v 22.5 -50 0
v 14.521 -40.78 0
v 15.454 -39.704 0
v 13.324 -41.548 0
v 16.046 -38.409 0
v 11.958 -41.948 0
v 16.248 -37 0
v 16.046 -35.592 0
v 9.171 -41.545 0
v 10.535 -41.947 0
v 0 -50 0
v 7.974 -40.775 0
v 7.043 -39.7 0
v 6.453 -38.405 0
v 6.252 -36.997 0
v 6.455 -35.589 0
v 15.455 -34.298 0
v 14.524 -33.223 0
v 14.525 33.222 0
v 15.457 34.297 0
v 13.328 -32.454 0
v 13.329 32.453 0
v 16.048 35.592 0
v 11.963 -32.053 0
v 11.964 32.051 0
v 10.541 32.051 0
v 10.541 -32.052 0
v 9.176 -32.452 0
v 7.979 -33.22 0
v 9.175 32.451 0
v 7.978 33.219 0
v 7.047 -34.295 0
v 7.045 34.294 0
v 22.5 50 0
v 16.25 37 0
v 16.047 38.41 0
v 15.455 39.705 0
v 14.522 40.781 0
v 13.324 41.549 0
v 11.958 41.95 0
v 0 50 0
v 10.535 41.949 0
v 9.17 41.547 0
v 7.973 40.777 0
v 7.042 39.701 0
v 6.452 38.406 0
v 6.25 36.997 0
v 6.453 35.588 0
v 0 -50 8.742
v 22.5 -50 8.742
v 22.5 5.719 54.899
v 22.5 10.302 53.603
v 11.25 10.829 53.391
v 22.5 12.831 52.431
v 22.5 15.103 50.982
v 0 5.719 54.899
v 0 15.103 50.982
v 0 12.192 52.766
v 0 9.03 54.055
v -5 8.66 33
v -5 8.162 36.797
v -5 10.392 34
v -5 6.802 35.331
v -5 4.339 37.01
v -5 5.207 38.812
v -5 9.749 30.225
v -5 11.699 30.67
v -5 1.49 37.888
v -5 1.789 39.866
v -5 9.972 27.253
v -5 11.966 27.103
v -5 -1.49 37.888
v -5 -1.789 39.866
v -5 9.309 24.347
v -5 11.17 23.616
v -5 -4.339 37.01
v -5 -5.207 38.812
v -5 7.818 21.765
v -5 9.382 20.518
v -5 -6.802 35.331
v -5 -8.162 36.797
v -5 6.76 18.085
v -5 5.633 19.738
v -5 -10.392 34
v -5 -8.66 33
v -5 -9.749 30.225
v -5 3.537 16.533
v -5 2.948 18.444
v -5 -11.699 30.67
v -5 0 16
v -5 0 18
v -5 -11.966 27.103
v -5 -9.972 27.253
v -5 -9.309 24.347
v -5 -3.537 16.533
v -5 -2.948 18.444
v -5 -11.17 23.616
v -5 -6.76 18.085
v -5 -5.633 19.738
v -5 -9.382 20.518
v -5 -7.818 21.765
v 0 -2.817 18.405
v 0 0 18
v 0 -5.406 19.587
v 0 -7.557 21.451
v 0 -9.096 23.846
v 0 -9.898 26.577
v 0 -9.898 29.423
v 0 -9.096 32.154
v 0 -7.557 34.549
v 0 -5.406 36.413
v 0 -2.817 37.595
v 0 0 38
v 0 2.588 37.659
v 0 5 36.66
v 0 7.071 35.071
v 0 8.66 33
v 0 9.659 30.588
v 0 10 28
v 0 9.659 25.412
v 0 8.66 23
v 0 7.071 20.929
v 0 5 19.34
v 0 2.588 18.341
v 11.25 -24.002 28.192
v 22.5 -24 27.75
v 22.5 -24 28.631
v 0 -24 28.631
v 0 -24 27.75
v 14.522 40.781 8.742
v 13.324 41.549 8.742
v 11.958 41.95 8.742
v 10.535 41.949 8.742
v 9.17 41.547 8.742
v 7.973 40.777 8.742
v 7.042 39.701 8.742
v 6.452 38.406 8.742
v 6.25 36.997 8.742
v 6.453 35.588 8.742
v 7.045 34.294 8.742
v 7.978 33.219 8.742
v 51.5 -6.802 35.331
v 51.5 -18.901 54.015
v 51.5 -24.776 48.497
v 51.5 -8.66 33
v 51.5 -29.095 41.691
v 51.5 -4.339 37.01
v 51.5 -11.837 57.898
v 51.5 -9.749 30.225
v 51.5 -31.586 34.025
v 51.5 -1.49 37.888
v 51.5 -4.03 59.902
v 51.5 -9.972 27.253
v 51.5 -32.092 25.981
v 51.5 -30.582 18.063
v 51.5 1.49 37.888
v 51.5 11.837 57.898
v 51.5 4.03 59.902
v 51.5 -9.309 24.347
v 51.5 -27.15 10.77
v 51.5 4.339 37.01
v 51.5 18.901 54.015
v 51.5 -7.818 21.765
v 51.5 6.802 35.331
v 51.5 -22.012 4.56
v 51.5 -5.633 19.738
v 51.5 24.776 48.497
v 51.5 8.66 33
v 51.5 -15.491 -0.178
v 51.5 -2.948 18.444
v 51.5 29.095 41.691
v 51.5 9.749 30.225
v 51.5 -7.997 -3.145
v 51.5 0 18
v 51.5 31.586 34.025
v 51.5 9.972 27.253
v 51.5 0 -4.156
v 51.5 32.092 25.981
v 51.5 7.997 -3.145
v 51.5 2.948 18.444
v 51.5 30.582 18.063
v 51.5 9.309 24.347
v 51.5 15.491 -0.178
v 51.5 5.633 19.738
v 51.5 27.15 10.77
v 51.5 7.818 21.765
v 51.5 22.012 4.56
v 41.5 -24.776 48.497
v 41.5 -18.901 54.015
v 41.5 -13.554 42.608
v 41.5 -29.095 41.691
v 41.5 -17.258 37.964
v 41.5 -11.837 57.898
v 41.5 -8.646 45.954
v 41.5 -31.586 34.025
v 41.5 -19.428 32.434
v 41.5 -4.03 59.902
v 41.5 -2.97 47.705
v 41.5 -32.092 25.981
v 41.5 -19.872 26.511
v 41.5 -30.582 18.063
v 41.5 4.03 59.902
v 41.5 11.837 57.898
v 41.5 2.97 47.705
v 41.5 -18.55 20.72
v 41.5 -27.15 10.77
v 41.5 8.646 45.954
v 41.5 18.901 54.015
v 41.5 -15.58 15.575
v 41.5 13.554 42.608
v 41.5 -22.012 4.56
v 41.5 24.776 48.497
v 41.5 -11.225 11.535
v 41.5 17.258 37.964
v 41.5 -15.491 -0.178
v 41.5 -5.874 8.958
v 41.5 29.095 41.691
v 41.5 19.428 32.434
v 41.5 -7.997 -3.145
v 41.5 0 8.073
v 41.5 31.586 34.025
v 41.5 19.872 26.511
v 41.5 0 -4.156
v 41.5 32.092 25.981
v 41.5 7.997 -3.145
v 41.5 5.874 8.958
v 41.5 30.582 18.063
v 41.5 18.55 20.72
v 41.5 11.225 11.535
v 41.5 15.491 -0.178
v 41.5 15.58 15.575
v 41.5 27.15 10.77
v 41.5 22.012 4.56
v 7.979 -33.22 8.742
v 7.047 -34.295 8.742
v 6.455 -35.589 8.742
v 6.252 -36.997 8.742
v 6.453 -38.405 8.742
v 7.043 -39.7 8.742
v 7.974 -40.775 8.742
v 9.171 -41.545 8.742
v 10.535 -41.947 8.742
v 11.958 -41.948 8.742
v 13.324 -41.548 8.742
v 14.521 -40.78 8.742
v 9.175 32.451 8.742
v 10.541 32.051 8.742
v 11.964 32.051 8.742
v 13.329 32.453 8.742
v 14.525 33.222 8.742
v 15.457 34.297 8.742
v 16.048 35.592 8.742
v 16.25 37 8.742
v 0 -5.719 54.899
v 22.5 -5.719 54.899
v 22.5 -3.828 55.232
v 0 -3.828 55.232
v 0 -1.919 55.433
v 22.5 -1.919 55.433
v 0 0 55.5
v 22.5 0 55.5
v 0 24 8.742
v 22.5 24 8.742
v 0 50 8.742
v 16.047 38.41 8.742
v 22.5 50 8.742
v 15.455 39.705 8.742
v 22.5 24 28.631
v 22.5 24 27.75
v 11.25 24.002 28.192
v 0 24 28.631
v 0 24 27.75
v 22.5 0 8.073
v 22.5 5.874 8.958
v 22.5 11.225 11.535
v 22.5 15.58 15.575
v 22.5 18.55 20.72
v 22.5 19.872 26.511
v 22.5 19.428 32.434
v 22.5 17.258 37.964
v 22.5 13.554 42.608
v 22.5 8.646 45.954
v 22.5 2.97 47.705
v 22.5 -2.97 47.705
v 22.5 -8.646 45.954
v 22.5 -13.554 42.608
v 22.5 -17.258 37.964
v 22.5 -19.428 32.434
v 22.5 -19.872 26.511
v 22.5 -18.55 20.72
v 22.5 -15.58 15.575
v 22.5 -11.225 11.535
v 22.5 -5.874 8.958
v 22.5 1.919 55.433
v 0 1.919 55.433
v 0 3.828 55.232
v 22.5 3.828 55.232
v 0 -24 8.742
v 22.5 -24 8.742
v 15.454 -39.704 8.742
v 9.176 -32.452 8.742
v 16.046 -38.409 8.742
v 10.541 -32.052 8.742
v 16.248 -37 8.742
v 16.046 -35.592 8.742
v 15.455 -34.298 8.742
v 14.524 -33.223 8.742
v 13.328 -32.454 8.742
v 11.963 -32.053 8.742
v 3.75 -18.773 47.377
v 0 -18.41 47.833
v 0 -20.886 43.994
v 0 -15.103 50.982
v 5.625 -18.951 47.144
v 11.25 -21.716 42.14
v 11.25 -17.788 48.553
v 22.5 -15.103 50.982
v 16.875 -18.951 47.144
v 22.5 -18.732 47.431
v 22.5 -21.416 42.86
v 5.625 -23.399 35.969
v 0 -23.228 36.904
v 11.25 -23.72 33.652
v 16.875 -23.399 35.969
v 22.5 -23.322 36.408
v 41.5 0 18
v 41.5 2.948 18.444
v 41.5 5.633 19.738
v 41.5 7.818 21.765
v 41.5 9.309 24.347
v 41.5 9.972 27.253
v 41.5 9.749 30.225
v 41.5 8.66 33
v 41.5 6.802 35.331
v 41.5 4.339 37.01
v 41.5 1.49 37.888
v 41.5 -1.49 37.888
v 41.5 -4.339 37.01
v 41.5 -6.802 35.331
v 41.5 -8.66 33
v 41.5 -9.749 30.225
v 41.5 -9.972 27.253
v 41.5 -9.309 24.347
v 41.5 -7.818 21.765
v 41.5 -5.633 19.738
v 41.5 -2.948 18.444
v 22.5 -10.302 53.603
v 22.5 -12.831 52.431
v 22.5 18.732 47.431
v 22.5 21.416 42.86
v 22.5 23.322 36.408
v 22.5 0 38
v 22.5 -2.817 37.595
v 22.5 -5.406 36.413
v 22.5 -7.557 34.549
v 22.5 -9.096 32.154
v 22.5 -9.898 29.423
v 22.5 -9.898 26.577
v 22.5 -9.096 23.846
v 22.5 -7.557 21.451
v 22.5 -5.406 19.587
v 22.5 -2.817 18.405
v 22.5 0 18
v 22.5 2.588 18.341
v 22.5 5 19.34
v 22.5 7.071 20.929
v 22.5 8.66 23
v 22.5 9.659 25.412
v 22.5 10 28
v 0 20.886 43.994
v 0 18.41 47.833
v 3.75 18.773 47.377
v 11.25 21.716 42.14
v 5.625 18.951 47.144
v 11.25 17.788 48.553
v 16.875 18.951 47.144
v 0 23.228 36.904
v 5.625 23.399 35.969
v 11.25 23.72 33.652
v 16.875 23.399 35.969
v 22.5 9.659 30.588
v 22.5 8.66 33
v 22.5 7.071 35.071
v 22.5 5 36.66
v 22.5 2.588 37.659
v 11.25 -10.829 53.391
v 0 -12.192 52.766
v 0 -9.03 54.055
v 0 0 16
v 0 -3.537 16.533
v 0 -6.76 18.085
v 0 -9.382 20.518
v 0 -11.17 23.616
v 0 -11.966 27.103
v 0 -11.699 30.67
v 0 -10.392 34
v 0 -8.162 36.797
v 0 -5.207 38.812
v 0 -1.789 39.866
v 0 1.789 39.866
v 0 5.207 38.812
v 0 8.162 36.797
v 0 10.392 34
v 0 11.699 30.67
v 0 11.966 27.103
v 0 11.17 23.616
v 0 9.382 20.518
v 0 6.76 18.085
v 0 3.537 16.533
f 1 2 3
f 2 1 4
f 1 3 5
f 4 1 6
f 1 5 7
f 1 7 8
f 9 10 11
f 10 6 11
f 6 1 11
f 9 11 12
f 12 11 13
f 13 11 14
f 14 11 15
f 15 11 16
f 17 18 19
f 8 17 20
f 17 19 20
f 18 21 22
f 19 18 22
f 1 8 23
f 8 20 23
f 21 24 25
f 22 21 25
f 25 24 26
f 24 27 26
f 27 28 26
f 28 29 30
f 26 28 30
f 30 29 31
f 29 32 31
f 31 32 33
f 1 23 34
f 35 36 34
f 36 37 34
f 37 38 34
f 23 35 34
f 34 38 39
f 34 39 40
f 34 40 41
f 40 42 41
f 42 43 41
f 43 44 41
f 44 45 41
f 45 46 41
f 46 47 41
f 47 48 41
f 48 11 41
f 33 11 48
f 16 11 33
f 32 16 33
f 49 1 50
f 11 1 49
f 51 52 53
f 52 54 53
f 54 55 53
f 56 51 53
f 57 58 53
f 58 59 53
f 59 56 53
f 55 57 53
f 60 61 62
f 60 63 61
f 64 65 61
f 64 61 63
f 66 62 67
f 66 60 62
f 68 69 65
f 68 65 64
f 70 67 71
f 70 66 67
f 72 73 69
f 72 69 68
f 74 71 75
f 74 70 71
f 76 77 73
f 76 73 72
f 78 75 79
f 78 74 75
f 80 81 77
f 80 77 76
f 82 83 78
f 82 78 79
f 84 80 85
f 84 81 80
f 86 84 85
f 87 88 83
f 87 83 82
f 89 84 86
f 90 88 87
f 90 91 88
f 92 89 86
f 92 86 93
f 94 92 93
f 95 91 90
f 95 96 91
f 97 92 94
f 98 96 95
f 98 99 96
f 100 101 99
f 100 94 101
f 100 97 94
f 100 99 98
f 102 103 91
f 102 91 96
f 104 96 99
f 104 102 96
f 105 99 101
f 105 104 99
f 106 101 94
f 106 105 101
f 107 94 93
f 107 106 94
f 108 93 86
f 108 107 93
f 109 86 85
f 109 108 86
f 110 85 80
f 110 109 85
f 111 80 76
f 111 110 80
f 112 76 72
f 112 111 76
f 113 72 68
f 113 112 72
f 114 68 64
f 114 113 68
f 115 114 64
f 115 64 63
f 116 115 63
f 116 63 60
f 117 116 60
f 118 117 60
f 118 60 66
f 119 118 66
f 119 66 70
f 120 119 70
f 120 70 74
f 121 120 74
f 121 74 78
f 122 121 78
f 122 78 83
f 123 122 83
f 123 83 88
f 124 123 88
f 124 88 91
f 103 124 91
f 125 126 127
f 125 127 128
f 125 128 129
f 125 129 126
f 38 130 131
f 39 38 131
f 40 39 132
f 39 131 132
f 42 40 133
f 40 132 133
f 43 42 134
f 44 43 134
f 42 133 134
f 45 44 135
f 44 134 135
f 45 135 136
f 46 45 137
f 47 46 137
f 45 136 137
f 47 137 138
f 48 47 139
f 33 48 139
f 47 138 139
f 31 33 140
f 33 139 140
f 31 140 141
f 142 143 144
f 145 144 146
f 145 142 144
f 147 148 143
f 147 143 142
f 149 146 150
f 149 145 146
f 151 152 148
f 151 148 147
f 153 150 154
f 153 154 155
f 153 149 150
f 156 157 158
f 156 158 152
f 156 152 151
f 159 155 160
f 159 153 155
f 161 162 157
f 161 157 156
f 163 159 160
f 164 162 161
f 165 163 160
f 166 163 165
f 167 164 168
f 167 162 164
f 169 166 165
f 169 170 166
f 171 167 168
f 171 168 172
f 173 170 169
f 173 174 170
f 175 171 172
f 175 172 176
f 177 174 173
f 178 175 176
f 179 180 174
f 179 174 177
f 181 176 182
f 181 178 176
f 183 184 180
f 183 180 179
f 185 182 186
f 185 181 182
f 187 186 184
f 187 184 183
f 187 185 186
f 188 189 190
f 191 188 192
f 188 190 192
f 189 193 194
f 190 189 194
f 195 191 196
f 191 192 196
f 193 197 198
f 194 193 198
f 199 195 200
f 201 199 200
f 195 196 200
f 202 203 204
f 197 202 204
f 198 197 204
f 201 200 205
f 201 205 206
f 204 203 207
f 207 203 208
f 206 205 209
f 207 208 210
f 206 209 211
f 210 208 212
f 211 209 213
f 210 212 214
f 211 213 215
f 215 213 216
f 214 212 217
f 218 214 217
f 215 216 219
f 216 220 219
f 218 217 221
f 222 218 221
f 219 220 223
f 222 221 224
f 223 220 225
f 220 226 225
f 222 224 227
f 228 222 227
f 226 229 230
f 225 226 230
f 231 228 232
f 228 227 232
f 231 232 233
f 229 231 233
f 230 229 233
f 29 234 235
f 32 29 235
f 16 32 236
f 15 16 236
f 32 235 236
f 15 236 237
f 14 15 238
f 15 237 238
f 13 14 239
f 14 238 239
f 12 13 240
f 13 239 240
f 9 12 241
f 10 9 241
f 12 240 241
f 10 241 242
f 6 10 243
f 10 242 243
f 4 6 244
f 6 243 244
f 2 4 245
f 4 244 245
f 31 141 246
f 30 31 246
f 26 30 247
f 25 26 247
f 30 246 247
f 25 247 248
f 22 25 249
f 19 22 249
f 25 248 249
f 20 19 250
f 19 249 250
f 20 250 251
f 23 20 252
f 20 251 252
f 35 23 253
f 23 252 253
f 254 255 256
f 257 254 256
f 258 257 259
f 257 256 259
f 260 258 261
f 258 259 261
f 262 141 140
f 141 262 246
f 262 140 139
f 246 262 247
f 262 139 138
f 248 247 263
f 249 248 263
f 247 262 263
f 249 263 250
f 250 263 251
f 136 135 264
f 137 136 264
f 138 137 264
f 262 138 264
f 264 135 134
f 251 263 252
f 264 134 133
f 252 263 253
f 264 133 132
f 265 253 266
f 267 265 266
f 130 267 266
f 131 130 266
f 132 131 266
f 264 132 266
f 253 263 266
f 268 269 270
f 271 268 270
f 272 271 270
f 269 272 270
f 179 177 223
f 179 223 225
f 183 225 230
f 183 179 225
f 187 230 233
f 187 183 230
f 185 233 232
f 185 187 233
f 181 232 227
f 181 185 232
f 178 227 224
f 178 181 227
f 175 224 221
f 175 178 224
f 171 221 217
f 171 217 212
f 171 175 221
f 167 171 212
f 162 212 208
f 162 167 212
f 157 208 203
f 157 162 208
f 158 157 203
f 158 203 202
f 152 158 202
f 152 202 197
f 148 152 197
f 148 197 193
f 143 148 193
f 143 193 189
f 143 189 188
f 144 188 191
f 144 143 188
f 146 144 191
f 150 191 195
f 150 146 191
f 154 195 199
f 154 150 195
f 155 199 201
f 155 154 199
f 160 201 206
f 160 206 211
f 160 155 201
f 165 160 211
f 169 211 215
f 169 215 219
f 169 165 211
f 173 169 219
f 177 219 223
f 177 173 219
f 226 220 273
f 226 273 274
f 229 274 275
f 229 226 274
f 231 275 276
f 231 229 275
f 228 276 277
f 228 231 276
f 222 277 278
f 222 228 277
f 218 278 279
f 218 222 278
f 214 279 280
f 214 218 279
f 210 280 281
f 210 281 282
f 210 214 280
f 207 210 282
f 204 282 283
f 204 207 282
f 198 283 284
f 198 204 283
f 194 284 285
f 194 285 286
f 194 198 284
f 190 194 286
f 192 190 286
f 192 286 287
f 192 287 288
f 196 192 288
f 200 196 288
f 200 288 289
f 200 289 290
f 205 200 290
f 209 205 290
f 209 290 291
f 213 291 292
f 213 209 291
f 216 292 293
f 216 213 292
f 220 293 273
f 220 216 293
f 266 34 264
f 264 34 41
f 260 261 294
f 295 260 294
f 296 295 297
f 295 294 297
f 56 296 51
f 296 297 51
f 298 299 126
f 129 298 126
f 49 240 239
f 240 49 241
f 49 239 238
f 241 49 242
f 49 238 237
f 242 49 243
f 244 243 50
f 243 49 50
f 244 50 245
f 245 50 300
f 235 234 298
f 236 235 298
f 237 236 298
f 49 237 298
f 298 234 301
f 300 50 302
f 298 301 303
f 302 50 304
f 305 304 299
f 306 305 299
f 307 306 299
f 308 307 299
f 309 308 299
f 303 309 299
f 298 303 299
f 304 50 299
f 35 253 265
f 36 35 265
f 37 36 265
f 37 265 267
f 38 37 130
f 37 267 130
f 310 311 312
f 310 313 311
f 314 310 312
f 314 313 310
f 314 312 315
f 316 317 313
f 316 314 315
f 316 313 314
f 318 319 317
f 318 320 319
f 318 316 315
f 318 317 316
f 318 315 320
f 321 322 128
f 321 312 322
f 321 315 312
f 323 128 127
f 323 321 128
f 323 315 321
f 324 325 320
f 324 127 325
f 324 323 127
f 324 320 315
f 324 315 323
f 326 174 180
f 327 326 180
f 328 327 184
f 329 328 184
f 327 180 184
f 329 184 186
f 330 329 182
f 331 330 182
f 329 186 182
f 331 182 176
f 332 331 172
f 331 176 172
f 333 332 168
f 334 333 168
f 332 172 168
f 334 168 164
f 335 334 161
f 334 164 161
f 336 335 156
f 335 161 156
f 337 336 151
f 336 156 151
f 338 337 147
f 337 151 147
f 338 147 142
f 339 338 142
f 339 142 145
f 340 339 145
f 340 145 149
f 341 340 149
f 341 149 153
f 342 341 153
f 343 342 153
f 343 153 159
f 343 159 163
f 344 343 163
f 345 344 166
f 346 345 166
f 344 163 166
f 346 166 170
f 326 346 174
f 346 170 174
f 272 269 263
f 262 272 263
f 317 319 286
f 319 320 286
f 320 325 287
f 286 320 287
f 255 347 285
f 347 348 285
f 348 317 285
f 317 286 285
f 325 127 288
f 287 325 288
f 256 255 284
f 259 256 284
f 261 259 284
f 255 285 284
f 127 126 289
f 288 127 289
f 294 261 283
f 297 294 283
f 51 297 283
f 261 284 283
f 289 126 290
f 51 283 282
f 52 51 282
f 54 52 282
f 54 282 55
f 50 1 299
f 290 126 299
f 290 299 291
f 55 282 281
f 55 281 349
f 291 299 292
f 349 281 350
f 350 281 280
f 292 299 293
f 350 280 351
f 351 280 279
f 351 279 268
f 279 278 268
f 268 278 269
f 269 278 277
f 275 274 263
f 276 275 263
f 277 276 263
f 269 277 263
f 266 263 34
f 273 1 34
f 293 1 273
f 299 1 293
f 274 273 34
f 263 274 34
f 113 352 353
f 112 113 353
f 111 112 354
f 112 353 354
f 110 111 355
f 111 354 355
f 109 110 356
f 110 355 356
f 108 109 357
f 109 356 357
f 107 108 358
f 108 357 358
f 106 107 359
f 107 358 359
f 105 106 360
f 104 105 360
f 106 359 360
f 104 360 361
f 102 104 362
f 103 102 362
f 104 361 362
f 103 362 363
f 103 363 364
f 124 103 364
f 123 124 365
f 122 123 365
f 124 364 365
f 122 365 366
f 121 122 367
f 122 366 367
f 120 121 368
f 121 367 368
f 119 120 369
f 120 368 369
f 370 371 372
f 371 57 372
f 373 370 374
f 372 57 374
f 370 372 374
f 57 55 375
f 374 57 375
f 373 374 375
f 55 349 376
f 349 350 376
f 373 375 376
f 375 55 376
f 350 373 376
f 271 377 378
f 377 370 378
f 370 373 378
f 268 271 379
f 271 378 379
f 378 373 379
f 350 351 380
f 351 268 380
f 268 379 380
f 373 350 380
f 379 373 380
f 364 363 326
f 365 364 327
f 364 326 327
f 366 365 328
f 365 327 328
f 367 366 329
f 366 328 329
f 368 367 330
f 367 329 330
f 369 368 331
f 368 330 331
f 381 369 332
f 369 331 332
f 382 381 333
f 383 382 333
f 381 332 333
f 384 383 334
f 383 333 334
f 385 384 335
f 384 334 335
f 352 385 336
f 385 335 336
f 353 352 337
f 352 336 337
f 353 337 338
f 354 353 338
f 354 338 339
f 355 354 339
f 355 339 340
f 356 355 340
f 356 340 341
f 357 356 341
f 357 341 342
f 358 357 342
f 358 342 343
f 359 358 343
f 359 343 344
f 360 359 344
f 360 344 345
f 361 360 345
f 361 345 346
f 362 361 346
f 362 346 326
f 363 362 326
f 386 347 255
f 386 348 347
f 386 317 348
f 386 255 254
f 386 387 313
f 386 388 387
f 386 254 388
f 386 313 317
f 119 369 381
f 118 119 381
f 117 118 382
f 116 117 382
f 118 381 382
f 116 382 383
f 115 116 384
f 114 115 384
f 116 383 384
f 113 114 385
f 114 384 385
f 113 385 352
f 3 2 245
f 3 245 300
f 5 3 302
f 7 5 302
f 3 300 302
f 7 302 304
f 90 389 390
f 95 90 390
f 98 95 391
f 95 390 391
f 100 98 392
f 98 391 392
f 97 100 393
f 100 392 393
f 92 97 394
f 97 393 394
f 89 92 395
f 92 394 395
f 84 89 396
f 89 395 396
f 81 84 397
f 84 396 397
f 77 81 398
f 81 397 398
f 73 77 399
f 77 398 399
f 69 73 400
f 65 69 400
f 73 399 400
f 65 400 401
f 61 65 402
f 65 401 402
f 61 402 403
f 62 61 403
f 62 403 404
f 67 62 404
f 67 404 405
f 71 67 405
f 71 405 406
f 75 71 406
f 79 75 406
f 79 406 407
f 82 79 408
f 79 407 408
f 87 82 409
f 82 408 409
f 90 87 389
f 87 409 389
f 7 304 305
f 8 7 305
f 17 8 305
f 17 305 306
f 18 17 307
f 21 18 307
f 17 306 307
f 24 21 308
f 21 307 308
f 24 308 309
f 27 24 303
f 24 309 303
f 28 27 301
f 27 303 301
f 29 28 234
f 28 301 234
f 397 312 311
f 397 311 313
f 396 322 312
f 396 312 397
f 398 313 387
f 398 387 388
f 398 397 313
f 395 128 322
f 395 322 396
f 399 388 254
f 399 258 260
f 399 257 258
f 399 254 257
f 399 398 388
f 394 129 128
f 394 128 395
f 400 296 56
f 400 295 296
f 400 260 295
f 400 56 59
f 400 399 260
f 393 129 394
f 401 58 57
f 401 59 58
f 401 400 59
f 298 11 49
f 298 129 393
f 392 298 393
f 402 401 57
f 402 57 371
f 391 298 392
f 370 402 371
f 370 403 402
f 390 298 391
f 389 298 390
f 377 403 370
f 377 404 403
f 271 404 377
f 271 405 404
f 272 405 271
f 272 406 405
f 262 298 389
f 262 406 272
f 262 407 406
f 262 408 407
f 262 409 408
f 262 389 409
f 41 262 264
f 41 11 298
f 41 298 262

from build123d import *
from build123d.topology import SkipClean

# Parameters (mm, degrees)
SKETCH1_W           = 100
SKETCH1_H           = 22.5
BOSS_EXTRUDE1_DEPTH = 55.5
CUT_EXTRUDE1_DEPTH  = 79.016023995
CUT_EXTRUDE2_DEPTH  = 73.059409747
CUT_EXTRUDE3_DEPTH  = 73.059409747
SKETCH6_R           = 12
SKETCH6_R_2         = 10
BOSS_EXTRUDE2_DEPTH = 5
BOSS_EXTRUDE3_START = 19
SKETCH7_R           = 19.927383843
SKETCH7_R_2         = 10
BOSS_EXTRUDE3_DEPTH = 19
BOSS_EXTRUDE5_START = 10
SKETCH9_R           = 32.155692567
SKETCH9_R_2         = 10
BOSS_EXTRUDE5_DEPTH = 10


with BuildPart() as part:
    # Sketch1 → Boss-Extrude1 (new body)
    with BuildSketch(Plane(origin=(0, 0, 0), x_dir=(0, 1, 0), z_dir=(0, 0, 1))):
        with Locations((0, -11.25)):
            Rectangle(SKETCH1_W, SKETCH1_H)
    extrude(amount=BOSS_EXTRUDE1_DEPTH)

    # Sketch2 → Cut-Extrude1 (cut, through all)
    with BuildSketch(Plane.YZ.offset(22.5)):
        with BuildLine():
            Line((-50, 8.742021972), (-24, 8.742021972))
            Line((-24, 8.742021972), (-24, 14.574278418))
            ThreePointArc((-24, 14.574278418), (-27.5, 28), (-24, 41.425721582))
            Line((-24, 41.425721582), (-24, 55.5))
            Line((-24, 55.5), (-50, 55.5))
            Line((-50, 55.5), (-50, 8.742021972))
        make_face()
        with BuildLine():
            ThreePointArc((-24, 41.425721582), (-27.5, 28), (-24, 14.574278418))
            Line((-24, 14.574278418), (-24, 27.75))
            add(Edge.make_bspline(
                [(-24, 28.630883492), (-24.003292455, 28.193991063), (-24, 27.75)],
                knots=[0.983572463, 0.983572463, 0.983572463, 1, 1, 1], degree=2))
            Line((-24, 28.630883492), (-24, 41.425721582))
        make_face()
        with BuildLine():
            ThreePointArc((-15.102725788, 50.981681265), (-20.126720607, 46.73940014), (-24, 41.425721582))
            Line((-24, 41.425721582), (-24, 28.630883492))
            add(Edge.make_bspline(
                [(-15.102725788, 50.981681265), (-23.880610505, 44.473278164), (-24, 28.630883492)],
                knots=[0.387884574, 0.387884574, 0.387884574, 0.983572463, 0.983572463, 0.983572463], degree=2))
        make_face()
        with BuildLine():
            Line((-24, 55.5), (-24, 41.425721582))
            ThreePointArc((-24, 41.425721582), (-20.126720607, 46.73940014), (-15.102725788, 50.981681265))
            add(Edge.make_bspline(
                [(-5.719329936, 54.898685192), (-11.246534385, 53.840872164), (-15.102725788, 50.981681265)],
                knots=[0.126194361, 0.126194361, 0.126194361, 0.387884574, 0.387884574, 0.387884574], degree=2))
            ThreePointArc((-5.719329936, 54.898685192), (-2.875426682, 55.349258151), (0, 55.5))
            Line((0, 55.5), (-24, 55.5))
        make_face()
        with BuildLine():
            ThreePointArc((0, 38), (-10, 28), (0, 18))
            Line((0, 18), (0, 38))
        make_face()
        with BuildLine():
            Line((0, 38), (0, 18))
            ThreePointArc((0, 18), (7.071067812, 20.928932188), (10, 28))
            ThreePointArc((10, 28), (7.071067812, 35.071067812), (0, 38))
        make_face()
        with BuildLine():
            Line((24, 55.5), (0, 55.5))
            ThreePointArc((0, 55.5), (2.875426682, 55.349258151), (5.719329936, 54.898685192))
            add(Edge.make_bspline(
                [(5.719329936, 54.898685192), (11.246534385, 53.840872164), (15.102725788, 50.981681265)],
                knots=[0.126194361, 0.126194361, 0.126194361, 0.387884574, 0.387884574, 0.387884574], degree=2))
            ThreePointArc((15.102725788, 50.981681265), (20.126720607, 46.73940014), (24, 41.425721582))
            Line((24, 41.425721582), (24, 55.5))
        make_face()
        with BuildLine():
            Line((24, 14.574278418), (24, 8.742021972))
            Line((24, 8.742021972), (50, 8.742021972))
            Line((50, 8.742021972), (50, 14.574278418))
            Line((50, 14.574278418), (50, 55.5))
            Line((50, 55.5), (24, 55.5))
            Line((24, 55.5), (24, 41.425721582))
            ThreePointArc((24, 41.425721582), (26.610618181, 34.937218463), (27.5, 28))
            ThreePointArc((27.5, 28), (26.610618181, 21.062781537), (24, 14.574278418))
        make_face()
        with BuildLine():
            Line((24, 27.75), (24, 14.574278418))
            ThreePointArc((24, 14.574278418), (26.610618181, 21.062781537), (27.5, 28))
            ThreePointArc((27.5, 28), (26.610618181, 34.937218463), (24, 41.425721582))
            Line((24, 41.425721582), (24, 28.630883492))
            add(Edge.make_bspline(
                [(24, 28.630883492), (24.003292455, 28.193991063), (24, 27.75)],
                knots=[0.983572463, 0.983572463, 0.983572463, 1, 1, 1], degree=2))
        make_face()
        with BuildLine():
            ThreePointArc((24, 41.425721582), (20.126720607, 46.73940014), (15.102725788, 50.981681265))
            add(Edge.make_bspline(
                [(15.102725788, 50.981681265), (23.880610505, 44.473278164), (24, 28.630883492)],
                knots=[0.387884574, 0.387884574, 0.387884574, 0.983572463, 0.983572463, 0.983572463], degree=2))
            Line((24, 28.630883492), (24, 41.425721582))
        make_face()
    extrude(amount=-CUT_EXTRUDE1_DEPTH, mode=Mode.SUBTRACT)

    # Sketch3 → Cut-Extrude2 (cut, through all)
    with BuildSketch(Plane.XY.offset(8.742021972)):
        with BuildLine():
            ThreePointArc((16.25, 37), (15.797494838, 39.078530898), (14.521883722, 40.780843412))
            Line((14.521883722, 40.780843412), (7.978116278, 33.219156588))
            ThreePointArc((7.978116278, 33.219156588), (13.328530898, 32.452505162), (16.25, 37))
        make_face()
        with BuildLine():
            Line((7.978116278, 33.219156588), (14.521883722, 40.780843412))
            ThreePointArc((14.521883722, 40.780843412), (7.469156588, 40.271883722), (7.978116278, 33.219156588))
        make_face()
    extrude(amount=-CUT_EXTRUDE2_DEPTH, mode=Mode.SUBTRACT)

    # Sketch5 → Cut-Extrude3 (cut, through all)
    with BuildSketch(Plane.XY.offset(8.742021972)):
        with BuildLine():
            ThreePointArc((16.248437988, -37), (13.32788156, -32.45392581), (7.979138422, -33.220337732))
            Line((7.979138422, -33.220337732), (14.520861578, -40.779662268))
            ThreePointArc((14.520861578, -40.779662268), (15.79607419, -39.07788156), (16.248437988, -37))
        make_face()
        with BuildLine():
            Line((14.520861578, -40.779662268), (7.979138422, -33.220337732))
            ThreePointArc((7.979138422, -33.220337732), (7.470337732, -40.270861578), (14.520861578, -40.779662268))
        make_face()
    extrude(amount=-CUT_EXTRUDE3_DEPTH, mode=Mode.SUBTRACT)

    # Sketch6 → Boss-Extrude2 (add)
    with SkipClean():  # the faces are left unmerged after this step: merging them gives an invalid solid
        with BuildSketch(Plane(origin=(0, 0, 0), x_dir=(0, -1, 0), z_dir=(-1, 0, 0))):
            with Locations(Location((0, 28, 0), (0, 0, 270))):
                Circle(SKETCH6_R)
            with Locations(Location((0, 28, 0), (0, 0, 270))):
                Circle(SKETCH6_R_2, mode=Mode.SUBTRACT)
        extrude(amount=BOSS_EXTRUDE2_DEPTH)

    # Sketch7 → Boss-Extrude3 (add)
    with SkipClean():  # the faces are left unmerged after this step: merging them gives an invalid solid
        with BuildSketch(Plane.YZ.offset(22.5).offset(BOSS_EXTRUDE3_START)):
            with Locations(Location((0, 28, 0), (0, 0, 270))):
                Circle(SKETCH7_R)
            with Locations(Location((0, 28, 0), (0, 0, 270))):
                Circle(SKETCH7_R_2, mode=Mode.SUBTRACT)
        extrude(amount=-BOSS_EXTRUDE3_DEPTH)

    # Sketch9 → Boss-Extrude5 (add)
    with SkipClean():  # the faces are left unmerged after this step: merging them gives an invalid solid
        with BuildSketch(Plane.YZ.offset(41.5).offset(BOSS_EXTRUDE5_START)):
            with Locations(Location((0, 28, 0), (0, 0, 270))):
                Circle(SKETCH9_R)
            with Locations(Location((0, 28, 0), (0, 0, 270))):
                Circle(SKETCH9_R_2, mode=Mode.SUBTRACT)
        extrude(amount=-BOSS_EXTRUDE5_DEPTH)


solid = part.part
